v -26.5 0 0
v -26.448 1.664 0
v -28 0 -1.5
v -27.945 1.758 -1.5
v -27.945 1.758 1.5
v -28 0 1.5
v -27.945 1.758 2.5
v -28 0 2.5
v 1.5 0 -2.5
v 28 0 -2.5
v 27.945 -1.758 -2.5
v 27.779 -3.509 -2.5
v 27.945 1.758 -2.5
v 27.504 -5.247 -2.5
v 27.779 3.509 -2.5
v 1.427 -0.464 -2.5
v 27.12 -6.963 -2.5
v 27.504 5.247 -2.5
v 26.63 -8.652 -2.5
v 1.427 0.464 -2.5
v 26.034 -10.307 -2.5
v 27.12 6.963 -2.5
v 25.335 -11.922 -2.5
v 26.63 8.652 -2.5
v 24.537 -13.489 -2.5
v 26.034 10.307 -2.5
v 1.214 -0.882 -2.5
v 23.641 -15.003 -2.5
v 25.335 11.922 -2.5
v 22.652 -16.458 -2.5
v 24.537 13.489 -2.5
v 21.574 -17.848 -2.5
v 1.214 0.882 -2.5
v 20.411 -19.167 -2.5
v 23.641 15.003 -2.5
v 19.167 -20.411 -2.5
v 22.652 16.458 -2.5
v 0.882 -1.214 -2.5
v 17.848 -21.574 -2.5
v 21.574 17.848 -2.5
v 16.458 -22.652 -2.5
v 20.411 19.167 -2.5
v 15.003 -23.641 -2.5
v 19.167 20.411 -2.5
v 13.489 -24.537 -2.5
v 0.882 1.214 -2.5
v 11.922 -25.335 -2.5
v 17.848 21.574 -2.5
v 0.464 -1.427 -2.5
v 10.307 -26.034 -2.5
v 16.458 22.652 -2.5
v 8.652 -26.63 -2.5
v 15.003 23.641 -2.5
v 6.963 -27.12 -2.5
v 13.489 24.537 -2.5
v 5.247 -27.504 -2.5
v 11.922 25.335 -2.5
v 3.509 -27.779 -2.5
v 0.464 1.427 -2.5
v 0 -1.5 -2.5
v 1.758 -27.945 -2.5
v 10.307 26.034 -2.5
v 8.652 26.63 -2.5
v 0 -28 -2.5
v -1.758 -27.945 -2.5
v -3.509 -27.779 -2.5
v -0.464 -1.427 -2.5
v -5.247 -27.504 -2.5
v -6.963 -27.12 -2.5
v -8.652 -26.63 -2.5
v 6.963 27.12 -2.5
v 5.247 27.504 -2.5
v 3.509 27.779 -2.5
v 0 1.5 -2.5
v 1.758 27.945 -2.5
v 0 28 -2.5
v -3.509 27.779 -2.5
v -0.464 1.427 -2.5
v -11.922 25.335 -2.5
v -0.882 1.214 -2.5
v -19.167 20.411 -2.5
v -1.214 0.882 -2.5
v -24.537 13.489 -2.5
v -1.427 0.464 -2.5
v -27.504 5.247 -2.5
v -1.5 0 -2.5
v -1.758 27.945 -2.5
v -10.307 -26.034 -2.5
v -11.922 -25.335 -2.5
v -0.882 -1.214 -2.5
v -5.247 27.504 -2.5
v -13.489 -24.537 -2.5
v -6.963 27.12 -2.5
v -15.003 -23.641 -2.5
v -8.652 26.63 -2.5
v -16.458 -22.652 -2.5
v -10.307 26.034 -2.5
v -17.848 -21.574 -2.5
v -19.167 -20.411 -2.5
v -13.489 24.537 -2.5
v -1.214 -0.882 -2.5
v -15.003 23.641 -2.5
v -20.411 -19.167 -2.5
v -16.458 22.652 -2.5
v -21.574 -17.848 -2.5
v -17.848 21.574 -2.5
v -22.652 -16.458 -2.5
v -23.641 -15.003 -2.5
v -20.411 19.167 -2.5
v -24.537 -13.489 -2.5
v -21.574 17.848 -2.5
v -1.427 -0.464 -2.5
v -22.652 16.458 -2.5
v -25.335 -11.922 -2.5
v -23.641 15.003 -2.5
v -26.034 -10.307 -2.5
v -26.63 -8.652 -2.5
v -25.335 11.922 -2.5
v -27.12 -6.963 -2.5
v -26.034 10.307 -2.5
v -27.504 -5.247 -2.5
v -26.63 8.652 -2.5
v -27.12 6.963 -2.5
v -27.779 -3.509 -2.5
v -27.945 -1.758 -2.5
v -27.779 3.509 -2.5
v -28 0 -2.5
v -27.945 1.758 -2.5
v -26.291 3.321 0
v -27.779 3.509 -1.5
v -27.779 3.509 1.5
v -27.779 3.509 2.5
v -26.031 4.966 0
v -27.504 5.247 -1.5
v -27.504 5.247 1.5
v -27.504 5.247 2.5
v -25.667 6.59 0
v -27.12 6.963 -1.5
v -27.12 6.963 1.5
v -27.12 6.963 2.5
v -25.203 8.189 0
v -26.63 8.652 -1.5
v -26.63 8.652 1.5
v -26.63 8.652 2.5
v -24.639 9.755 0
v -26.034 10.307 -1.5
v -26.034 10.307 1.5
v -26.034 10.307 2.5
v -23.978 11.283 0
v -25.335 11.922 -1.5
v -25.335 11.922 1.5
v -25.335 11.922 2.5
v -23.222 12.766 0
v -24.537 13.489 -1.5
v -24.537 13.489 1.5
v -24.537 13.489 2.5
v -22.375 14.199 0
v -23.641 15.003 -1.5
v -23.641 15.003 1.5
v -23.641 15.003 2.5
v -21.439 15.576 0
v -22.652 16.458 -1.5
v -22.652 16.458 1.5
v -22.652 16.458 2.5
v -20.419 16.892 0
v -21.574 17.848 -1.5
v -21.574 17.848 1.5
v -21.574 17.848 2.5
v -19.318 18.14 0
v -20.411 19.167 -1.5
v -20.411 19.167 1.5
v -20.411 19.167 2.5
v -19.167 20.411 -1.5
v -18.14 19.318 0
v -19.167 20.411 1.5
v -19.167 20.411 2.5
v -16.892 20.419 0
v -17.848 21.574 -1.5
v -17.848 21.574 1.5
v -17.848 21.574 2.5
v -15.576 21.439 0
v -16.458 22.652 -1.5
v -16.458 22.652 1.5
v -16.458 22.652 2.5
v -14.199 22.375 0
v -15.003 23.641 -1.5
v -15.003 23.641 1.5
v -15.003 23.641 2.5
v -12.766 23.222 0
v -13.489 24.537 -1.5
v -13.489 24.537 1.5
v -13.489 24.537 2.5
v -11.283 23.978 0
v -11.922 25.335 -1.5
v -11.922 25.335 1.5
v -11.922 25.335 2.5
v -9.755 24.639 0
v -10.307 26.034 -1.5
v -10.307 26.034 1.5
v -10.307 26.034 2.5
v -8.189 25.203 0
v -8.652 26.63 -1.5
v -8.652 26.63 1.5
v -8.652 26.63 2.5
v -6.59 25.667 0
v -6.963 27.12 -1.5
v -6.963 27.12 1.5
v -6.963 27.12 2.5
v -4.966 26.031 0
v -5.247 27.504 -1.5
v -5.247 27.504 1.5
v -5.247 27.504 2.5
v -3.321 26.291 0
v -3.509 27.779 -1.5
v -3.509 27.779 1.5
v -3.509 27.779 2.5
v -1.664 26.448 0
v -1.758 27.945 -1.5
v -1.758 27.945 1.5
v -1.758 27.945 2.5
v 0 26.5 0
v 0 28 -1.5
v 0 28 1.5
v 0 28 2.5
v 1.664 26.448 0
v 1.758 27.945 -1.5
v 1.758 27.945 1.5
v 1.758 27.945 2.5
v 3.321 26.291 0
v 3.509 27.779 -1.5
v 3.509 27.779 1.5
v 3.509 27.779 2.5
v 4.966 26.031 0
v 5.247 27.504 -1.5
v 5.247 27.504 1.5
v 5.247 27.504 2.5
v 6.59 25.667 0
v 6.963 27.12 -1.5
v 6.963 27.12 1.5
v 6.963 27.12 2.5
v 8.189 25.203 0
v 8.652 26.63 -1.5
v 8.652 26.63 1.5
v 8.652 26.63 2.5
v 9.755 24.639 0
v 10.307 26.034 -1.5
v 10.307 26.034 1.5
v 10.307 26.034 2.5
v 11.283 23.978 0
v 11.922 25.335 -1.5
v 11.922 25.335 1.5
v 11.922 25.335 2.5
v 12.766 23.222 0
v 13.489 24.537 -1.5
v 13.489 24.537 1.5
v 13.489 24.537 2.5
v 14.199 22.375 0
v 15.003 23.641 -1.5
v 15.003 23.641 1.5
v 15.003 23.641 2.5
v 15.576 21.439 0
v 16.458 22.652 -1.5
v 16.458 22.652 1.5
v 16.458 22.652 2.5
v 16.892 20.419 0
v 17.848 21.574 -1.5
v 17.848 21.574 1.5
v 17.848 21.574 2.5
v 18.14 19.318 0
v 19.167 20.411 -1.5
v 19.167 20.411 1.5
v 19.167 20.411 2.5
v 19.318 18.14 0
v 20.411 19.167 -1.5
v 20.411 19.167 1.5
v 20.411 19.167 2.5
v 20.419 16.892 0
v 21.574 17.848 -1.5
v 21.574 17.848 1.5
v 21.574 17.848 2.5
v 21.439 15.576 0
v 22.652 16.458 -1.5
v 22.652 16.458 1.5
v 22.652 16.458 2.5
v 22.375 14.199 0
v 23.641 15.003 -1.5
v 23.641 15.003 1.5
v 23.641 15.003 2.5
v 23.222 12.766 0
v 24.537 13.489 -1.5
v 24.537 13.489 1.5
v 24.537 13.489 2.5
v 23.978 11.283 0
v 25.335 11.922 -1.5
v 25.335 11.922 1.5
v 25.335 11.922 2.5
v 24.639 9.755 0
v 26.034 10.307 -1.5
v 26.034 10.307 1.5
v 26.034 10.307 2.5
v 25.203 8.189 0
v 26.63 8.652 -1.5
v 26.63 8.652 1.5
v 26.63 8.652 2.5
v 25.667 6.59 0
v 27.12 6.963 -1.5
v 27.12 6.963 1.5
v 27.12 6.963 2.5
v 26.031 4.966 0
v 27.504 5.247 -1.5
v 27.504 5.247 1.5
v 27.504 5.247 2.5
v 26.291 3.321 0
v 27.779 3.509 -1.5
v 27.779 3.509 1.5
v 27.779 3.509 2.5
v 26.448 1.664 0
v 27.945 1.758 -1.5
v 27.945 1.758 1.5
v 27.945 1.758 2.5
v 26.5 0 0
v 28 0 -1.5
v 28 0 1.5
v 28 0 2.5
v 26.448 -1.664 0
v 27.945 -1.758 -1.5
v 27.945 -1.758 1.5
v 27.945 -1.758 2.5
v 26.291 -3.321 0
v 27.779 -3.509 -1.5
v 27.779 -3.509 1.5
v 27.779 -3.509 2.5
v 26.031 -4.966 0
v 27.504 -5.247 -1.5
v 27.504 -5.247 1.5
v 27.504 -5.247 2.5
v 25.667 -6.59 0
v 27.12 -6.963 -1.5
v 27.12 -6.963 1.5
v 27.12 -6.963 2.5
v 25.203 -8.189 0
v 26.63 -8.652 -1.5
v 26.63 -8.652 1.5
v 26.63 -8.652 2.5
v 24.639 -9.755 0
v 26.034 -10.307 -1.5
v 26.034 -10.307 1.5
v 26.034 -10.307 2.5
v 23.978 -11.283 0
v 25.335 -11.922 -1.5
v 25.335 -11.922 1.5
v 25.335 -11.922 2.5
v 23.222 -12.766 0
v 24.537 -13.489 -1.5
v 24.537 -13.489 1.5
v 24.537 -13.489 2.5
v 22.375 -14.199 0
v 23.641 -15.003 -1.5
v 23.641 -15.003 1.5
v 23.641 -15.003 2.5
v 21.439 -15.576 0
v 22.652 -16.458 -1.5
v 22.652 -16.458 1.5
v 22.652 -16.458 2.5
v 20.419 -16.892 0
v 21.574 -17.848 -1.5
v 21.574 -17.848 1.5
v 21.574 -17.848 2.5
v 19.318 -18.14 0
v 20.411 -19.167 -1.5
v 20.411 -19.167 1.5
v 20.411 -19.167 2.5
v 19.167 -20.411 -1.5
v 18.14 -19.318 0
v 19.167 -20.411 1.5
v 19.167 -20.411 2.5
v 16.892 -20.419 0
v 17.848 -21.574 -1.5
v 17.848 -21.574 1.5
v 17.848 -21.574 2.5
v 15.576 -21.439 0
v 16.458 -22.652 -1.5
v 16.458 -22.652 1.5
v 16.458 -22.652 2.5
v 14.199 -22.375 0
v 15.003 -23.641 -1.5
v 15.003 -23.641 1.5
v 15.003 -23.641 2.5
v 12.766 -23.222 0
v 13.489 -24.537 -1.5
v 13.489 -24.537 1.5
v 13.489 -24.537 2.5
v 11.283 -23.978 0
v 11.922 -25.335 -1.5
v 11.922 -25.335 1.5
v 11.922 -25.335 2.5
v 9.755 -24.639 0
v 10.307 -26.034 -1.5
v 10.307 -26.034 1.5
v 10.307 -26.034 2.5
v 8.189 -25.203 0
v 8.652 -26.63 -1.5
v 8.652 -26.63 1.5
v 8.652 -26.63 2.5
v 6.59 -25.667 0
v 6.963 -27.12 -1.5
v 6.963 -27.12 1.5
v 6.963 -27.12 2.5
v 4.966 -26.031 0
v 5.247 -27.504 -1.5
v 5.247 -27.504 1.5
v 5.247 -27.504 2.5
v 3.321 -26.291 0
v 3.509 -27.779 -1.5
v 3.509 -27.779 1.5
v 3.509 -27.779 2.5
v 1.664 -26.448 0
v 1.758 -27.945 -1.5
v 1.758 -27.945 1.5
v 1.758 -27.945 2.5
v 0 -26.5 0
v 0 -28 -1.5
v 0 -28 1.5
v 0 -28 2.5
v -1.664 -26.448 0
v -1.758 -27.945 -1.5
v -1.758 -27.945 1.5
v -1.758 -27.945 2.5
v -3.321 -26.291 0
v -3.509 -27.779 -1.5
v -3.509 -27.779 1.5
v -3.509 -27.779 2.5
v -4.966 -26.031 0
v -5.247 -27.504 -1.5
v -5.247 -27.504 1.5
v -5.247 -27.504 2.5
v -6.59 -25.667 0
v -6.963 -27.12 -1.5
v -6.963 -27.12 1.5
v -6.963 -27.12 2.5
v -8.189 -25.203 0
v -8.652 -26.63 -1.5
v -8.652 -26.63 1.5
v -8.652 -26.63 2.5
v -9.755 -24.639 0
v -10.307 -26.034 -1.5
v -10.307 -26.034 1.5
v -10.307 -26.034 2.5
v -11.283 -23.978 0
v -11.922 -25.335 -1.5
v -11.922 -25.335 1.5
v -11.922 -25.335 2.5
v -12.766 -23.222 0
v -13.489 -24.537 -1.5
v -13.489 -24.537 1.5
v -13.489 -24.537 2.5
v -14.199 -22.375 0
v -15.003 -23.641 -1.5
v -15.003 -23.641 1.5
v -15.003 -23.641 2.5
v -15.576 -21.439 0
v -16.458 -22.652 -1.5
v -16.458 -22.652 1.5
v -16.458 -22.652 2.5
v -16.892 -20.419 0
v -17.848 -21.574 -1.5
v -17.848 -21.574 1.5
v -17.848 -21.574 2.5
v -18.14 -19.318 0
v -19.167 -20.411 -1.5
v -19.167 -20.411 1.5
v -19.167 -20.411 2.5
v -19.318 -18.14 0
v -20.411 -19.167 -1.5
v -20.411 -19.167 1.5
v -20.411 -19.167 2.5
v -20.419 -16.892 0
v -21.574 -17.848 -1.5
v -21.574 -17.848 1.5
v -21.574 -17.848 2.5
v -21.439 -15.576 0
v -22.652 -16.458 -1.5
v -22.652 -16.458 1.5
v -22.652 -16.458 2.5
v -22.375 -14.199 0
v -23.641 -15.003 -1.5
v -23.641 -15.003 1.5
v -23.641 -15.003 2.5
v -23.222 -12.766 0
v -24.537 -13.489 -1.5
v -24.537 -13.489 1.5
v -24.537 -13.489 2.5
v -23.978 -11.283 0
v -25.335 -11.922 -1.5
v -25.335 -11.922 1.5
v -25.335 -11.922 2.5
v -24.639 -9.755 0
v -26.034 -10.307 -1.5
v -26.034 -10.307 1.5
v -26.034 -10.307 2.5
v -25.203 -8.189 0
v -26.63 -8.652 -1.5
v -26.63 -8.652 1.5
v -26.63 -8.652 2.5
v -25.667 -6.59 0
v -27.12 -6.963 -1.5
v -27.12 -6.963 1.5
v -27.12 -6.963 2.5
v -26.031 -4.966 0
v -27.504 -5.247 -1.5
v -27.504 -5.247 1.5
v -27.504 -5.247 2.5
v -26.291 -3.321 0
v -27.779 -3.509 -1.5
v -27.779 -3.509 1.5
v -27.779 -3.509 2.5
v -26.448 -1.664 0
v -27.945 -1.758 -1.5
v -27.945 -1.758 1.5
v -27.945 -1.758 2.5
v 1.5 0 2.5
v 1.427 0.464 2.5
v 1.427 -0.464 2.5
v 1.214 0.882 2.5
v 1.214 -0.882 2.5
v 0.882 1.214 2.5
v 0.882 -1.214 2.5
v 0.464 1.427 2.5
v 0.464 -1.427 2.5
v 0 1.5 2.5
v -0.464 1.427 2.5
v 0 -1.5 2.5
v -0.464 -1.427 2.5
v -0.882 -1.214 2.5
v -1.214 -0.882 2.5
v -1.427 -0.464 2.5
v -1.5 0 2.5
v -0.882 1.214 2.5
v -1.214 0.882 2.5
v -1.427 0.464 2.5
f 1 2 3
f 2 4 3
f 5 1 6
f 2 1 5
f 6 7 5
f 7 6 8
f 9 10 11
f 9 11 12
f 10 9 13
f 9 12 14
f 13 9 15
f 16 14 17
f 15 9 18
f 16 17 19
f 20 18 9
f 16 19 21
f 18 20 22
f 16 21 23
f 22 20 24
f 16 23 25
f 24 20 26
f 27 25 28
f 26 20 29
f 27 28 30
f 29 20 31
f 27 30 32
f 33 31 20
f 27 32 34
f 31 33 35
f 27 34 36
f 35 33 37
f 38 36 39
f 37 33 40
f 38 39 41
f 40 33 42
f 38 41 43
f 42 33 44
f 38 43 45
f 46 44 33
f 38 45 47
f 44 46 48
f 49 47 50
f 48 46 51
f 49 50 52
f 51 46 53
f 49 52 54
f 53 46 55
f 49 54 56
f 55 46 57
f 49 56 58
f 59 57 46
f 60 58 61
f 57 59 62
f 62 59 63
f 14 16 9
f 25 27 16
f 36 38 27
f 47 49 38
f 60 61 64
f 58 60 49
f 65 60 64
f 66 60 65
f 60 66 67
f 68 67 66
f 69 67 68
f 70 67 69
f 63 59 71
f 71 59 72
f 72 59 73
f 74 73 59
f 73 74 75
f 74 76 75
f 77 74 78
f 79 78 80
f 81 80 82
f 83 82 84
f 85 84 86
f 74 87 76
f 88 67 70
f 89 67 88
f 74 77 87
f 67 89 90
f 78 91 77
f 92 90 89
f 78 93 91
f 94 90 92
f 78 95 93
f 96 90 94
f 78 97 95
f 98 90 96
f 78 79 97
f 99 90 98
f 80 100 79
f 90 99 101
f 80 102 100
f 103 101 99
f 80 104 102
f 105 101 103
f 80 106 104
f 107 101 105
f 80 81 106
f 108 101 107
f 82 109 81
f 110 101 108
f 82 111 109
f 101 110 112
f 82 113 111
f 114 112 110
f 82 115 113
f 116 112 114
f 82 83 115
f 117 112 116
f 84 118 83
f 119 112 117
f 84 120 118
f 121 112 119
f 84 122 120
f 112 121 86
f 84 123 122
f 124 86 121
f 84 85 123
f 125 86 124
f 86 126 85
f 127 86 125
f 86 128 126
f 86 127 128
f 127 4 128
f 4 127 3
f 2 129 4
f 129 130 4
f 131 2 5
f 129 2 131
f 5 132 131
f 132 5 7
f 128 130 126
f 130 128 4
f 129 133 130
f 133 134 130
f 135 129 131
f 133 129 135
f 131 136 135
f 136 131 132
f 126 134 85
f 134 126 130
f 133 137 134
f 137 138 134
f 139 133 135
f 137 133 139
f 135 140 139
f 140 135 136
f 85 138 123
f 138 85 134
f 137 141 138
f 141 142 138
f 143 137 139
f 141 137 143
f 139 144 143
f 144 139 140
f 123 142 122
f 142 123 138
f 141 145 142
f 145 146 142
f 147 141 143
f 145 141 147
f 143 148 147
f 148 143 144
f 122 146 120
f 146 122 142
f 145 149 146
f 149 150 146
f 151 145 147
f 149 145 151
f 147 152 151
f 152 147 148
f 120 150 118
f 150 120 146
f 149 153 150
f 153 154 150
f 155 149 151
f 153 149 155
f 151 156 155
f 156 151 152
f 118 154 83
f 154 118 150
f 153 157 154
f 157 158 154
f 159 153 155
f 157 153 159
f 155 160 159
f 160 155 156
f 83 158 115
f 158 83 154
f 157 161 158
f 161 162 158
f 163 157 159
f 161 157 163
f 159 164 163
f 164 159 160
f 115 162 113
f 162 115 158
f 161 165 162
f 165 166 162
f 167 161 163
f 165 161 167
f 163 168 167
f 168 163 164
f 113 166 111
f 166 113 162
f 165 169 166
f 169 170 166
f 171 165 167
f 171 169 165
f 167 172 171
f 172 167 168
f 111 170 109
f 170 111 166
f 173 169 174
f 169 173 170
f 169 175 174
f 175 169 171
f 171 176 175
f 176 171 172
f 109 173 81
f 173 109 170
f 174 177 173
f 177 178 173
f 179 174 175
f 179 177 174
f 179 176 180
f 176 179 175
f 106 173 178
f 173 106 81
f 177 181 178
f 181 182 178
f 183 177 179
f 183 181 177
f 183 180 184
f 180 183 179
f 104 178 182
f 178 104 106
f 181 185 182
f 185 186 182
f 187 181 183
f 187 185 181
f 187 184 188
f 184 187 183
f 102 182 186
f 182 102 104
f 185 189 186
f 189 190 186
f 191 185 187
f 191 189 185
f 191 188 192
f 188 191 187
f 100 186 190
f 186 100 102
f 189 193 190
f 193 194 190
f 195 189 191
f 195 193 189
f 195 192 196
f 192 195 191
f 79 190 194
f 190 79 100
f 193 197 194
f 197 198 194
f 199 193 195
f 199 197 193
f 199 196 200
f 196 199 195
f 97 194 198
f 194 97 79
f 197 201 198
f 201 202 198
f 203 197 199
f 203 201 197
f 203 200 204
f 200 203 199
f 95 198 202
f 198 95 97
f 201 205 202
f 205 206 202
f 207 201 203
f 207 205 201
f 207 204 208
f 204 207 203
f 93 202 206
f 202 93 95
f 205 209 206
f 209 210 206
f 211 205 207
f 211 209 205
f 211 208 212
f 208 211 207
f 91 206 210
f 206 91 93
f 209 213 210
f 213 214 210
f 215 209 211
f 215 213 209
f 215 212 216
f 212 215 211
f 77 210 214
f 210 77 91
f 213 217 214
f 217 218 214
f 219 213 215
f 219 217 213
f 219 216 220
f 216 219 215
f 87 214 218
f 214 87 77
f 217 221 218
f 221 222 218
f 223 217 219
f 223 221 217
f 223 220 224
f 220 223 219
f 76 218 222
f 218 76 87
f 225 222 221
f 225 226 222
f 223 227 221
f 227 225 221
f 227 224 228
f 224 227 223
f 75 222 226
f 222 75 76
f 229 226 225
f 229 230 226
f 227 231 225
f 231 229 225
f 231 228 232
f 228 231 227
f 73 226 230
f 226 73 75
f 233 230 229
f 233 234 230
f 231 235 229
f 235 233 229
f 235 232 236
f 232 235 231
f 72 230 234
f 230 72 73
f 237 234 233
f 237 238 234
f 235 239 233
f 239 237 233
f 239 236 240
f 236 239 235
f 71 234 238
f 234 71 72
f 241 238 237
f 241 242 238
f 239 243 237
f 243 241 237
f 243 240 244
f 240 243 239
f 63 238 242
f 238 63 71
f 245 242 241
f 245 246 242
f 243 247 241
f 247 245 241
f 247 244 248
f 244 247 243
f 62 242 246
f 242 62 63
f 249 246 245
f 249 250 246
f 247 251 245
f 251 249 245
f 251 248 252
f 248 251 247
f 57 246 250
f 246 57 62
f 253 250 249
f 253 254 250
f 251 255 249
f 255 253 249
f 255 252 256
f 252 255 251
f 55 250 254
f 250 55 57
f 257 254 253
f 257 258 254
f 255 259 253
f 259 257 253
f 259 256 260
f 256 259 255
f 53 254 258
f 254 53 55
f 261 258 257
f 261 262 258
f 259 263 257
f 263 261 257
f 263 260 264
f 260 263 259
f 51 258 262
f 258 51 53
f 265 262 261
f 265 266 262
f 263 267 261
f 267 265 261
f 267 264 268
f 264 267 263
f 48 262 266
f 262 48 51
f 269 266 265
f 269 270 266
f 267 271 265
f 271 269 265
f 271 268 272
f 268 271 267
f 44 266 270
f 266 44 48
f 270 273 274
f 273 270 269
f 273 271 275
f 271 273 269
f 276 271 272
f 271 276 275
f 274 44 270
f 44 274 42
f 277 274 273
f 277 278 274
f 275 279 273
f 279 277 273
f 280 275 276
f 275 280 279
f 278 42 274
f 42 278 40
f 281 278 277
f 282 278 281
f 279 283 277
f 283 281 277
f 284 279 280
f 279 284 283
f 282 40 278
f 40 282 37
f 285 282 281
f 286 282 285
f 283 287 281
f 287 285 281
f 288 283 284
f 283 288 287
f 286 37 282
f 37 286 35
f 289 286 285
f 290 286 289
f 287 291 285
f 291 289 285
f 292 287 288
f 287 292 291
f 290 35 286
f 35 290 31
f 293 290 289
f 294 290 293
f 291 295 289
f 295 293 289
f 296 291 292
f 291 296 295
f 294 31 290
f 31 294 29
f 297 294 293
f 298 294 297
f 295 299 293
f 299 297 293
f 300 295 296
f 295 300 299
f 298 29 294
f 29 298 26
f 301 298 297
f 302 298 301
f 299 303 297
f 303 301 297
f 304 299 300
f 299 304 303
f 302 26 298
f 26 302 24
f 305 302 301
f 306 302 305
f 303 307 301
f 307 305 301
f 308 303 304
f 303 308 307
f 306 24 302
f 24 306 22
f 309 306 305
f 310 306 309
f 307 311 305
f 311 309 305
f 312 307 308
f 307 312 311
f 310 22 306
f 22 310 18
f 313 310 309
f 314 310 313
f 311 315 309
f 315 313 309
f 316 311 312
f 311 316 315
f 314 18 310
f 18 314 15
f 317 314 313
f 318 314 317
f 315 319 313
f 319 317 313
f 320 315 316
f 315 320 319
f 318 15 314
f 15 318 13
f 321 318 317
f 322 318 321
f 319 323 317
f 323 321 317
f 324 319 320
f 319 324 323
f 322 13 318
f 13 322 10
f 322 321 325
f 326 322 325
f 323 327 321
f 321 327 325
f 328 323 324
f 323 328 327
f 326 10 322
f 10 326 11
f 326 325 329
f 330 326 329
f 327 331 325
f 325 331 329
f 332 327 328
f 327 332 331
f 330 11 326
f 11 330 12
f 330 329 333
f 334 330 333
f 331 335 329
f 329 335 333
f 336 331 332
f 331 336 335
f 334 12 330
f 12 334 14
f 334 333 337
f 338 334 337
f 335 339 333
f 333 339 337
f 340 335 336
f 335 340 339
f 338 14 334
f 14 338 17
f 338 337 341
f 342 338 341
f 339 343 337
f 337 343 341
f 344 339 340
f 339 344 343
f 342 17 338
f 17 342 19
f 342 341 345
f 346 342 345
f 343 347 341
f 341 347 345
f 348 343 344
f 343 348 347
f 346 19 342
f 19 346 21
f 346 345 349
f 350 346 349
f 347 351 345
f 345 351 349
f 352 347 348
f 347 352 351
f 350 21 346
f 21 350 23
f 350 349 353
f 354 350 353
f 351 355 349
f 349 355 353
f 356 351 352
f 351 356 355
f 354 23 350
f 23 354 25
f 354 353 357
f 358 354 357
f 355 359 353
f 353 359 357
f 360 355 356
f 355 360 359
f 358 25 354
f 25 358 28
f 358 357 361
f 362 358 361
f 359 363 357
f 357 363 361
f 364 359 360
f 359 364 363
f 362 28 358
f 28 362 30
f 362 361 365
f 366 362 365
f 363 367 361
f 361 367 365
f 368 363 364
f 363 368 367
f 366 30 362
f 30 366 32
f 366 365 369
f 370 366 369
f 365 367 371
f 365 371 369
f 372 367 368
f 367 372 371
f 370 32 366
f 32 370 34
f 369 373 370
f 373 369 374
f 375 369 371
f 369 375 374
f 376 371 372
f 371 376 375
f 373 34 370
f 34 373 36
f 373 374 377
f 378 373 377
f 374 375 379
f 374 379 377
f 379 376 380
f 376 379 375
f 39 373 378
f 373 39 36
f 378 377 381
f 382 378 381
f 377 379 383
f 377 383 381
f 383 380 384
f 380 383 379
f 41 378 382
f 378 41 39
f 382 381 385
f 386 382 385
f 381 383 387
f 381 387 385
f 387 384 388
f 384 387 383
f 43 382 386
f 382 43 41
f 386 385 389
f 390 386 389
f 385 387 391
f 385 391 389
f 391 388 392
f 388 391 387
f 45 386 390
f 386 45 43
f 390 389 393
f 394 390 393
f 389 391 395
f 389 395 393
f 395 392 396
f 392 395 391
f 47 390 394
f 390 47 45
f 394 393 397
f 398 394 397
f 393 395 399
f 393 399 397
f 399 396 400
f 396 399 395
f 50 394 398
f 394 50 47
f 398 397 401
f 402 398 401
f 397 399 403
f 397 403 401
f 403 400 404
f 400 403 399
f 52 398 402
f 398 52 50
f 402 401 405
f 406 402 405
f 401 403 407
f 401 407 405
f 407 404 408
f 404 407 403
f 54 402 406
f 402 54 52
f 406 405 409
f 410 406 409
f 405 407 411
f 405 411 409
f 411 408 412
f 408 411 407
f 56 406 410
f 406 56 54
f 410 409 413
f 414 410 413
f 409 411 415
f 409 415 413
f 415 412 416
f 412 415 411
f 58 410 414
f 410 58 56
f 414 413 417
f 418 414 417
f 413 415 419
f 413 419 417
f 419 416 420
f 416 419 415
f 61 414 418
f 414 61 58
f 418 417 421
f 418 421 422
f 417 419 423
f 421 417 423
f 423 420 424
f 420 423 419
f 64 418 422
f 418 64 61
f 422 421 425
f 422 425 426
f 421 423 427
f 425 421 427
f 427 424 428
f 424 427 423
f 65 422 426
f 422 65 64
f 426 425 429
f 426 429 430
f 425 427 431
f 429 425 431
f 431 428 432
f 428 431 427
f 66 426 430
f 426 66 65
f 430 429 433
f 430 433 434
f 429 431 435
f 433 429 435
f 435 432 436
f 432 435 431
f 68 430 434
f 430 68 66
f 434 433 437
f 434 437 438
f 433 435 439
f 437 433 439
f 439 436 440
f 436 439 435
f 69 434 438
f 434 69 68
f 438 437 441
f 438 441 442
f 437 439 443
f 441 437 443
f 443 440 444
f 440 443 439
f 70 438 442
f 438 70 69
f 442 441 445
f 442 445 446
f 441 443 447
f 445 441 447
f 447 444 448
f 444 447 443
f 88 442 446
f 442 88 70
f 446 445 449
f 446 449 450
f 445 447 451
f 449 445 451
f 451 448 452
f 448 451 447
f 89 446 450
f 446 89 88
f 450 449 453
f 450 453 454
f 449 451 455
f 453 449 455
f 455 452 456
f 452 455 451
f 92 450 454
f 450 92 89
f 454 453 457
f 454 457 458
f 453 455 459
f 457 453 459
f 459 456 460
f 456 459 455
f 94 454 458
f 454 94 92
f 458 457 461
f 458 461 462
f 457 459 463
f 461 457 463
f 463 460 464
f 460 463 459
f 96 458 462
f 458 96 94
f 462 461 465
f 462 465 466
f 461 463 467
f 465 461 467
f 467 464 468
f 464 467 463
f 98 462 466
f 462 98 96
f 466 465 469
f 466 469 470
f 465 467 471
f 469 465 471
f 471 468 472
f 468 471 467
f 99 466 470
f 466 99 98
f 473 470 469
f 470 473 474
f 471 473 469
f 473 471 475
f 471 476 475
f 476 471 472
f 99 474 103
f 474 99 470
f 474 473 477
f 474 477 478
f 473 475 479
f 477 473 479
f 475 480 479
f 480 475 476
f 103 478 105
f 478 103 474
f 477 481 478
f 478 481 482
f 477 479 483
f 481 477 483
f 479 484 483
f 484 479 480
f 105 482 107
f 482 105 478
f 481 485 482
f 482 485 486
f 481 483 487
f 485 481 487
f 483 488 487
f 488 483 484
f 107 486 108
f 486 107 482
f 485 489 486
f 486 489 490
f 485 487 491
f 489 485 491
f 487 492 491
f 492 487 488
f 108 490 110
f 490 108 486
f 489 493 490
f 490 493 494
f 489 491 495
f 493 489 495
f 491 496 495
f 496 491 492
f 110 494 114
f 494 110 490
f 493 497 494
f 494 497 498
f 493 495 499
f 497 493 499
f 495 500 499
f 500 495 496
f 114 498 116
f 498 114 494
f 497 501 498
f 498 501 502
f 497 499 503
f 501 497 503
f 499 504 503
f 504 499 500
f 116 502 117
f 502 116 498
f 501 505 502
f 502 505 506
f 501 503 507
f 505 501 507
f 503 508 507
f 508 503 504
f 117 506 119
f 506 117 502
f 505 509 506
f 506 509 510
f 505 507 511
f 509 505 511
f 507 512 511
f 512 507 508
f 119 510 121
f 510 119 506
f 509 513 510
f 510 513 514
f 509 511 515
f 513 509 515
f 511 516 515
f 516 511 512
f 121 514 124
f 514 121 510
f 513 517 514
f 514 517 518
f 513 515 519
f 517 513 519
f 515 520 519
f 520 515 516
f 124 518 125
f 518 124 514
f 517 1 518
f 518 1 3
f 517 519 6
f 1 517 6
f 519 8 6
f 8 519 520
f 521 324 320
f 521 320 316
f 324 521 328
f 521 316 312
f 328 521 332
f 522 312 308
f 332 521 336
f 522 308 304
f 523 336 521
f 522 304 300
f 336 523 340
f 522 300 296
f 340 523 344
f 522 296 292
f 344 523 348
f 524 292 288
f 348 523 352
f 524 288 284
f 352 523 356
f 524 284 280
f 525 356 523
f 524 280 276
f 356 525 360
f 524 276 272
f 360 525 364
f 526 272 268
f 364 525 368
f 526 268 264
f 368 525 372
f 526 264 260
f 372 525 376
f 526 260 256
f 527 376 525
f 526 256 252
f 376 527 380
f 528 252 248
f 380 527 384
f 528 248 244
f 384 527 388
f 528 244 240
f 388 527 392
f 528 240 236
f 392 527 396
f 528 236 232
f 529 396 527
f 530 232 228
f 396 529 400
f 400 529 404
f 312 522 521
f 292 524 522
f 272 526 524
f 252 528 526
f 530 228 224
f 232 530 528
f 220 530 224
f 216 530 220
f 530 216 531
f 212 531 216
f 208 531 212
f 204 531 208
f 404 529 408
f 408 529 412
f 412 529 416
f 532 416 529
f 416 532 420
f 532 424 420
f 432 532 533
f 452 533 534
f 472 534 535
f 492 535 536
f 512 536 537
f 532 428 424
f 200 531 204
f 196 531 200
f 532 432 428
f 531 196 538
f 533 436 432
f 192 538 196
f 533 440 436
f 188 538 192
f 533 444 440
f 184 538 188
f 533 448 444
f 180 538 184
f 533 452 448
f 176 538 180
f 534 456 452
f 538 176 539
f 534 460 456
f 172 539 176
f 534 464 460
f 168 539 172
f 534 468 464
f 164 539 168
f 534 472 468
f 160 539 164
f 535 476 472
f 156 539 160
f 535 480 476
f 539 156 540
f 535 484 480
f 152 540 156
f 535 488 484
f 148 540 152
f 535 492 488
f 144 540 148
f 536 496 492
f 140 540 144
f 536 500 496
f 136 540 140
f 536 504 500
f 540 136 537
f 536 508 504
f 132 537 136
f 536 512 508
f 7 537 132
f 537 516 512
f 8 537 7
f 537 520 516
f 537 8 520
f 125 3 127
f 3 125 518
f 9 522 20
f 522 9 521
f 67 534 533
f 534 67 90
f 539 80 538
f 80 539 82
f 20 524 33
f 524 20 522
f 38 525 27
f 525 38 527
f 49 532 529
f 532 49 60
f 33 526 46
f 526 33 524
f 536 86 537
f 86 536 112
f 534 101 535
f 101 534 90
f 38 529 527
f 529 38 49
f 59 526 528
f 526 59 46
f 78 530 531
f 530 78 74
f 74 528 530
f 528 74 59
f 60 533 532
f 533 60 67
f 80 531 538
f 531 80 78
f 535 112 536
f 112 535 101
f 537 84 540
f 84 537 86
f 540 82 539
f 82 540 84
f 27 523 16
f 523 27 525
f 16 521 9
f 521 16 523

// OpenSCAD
//-- Parámetros de la rueda
di=50;  //-- Diámetro interno junta tórica
ds=3;   //-- Diámetro junta tórica
h=ds+2; //-- Grosor rueda

//-- Parámetros calculados
d=di+2*ds;  //-- Diámetro rueda
r1=d/2;     //-- Radio de la rueda
r2=ds/2;    //-- Radio de la junta tórica

//-- Sección rueda
module section(){
    difference(){
        translate([r1/2,0,0])
            square([r1,h],center=true);

        //-- Alojamiento circular
        *translate([r1, 0, 0])
            circle(d=3,$fn=20);

        //-- Alojamiento triangular
        translate([r1-r2, 0, 0])
            polygon(points=[
                [0,0],
                [r2+1,r2+1],
                [r2+1,-r2-1],
                ]);
    }
}

//-- Junta tórica
module junta(){
    rotate_extrude($fn=100)
        translate([r1,0,0])
            circle(d=ds);
}

//-- Rueda
difference() {
    rotate_extrude(convexity=10,$fn=100)
        section();

    //-- Eje de la rueda
    cylinder(d=3,h=h+10,center=true,$fn=20);
}

color("grey")
    *junta();
